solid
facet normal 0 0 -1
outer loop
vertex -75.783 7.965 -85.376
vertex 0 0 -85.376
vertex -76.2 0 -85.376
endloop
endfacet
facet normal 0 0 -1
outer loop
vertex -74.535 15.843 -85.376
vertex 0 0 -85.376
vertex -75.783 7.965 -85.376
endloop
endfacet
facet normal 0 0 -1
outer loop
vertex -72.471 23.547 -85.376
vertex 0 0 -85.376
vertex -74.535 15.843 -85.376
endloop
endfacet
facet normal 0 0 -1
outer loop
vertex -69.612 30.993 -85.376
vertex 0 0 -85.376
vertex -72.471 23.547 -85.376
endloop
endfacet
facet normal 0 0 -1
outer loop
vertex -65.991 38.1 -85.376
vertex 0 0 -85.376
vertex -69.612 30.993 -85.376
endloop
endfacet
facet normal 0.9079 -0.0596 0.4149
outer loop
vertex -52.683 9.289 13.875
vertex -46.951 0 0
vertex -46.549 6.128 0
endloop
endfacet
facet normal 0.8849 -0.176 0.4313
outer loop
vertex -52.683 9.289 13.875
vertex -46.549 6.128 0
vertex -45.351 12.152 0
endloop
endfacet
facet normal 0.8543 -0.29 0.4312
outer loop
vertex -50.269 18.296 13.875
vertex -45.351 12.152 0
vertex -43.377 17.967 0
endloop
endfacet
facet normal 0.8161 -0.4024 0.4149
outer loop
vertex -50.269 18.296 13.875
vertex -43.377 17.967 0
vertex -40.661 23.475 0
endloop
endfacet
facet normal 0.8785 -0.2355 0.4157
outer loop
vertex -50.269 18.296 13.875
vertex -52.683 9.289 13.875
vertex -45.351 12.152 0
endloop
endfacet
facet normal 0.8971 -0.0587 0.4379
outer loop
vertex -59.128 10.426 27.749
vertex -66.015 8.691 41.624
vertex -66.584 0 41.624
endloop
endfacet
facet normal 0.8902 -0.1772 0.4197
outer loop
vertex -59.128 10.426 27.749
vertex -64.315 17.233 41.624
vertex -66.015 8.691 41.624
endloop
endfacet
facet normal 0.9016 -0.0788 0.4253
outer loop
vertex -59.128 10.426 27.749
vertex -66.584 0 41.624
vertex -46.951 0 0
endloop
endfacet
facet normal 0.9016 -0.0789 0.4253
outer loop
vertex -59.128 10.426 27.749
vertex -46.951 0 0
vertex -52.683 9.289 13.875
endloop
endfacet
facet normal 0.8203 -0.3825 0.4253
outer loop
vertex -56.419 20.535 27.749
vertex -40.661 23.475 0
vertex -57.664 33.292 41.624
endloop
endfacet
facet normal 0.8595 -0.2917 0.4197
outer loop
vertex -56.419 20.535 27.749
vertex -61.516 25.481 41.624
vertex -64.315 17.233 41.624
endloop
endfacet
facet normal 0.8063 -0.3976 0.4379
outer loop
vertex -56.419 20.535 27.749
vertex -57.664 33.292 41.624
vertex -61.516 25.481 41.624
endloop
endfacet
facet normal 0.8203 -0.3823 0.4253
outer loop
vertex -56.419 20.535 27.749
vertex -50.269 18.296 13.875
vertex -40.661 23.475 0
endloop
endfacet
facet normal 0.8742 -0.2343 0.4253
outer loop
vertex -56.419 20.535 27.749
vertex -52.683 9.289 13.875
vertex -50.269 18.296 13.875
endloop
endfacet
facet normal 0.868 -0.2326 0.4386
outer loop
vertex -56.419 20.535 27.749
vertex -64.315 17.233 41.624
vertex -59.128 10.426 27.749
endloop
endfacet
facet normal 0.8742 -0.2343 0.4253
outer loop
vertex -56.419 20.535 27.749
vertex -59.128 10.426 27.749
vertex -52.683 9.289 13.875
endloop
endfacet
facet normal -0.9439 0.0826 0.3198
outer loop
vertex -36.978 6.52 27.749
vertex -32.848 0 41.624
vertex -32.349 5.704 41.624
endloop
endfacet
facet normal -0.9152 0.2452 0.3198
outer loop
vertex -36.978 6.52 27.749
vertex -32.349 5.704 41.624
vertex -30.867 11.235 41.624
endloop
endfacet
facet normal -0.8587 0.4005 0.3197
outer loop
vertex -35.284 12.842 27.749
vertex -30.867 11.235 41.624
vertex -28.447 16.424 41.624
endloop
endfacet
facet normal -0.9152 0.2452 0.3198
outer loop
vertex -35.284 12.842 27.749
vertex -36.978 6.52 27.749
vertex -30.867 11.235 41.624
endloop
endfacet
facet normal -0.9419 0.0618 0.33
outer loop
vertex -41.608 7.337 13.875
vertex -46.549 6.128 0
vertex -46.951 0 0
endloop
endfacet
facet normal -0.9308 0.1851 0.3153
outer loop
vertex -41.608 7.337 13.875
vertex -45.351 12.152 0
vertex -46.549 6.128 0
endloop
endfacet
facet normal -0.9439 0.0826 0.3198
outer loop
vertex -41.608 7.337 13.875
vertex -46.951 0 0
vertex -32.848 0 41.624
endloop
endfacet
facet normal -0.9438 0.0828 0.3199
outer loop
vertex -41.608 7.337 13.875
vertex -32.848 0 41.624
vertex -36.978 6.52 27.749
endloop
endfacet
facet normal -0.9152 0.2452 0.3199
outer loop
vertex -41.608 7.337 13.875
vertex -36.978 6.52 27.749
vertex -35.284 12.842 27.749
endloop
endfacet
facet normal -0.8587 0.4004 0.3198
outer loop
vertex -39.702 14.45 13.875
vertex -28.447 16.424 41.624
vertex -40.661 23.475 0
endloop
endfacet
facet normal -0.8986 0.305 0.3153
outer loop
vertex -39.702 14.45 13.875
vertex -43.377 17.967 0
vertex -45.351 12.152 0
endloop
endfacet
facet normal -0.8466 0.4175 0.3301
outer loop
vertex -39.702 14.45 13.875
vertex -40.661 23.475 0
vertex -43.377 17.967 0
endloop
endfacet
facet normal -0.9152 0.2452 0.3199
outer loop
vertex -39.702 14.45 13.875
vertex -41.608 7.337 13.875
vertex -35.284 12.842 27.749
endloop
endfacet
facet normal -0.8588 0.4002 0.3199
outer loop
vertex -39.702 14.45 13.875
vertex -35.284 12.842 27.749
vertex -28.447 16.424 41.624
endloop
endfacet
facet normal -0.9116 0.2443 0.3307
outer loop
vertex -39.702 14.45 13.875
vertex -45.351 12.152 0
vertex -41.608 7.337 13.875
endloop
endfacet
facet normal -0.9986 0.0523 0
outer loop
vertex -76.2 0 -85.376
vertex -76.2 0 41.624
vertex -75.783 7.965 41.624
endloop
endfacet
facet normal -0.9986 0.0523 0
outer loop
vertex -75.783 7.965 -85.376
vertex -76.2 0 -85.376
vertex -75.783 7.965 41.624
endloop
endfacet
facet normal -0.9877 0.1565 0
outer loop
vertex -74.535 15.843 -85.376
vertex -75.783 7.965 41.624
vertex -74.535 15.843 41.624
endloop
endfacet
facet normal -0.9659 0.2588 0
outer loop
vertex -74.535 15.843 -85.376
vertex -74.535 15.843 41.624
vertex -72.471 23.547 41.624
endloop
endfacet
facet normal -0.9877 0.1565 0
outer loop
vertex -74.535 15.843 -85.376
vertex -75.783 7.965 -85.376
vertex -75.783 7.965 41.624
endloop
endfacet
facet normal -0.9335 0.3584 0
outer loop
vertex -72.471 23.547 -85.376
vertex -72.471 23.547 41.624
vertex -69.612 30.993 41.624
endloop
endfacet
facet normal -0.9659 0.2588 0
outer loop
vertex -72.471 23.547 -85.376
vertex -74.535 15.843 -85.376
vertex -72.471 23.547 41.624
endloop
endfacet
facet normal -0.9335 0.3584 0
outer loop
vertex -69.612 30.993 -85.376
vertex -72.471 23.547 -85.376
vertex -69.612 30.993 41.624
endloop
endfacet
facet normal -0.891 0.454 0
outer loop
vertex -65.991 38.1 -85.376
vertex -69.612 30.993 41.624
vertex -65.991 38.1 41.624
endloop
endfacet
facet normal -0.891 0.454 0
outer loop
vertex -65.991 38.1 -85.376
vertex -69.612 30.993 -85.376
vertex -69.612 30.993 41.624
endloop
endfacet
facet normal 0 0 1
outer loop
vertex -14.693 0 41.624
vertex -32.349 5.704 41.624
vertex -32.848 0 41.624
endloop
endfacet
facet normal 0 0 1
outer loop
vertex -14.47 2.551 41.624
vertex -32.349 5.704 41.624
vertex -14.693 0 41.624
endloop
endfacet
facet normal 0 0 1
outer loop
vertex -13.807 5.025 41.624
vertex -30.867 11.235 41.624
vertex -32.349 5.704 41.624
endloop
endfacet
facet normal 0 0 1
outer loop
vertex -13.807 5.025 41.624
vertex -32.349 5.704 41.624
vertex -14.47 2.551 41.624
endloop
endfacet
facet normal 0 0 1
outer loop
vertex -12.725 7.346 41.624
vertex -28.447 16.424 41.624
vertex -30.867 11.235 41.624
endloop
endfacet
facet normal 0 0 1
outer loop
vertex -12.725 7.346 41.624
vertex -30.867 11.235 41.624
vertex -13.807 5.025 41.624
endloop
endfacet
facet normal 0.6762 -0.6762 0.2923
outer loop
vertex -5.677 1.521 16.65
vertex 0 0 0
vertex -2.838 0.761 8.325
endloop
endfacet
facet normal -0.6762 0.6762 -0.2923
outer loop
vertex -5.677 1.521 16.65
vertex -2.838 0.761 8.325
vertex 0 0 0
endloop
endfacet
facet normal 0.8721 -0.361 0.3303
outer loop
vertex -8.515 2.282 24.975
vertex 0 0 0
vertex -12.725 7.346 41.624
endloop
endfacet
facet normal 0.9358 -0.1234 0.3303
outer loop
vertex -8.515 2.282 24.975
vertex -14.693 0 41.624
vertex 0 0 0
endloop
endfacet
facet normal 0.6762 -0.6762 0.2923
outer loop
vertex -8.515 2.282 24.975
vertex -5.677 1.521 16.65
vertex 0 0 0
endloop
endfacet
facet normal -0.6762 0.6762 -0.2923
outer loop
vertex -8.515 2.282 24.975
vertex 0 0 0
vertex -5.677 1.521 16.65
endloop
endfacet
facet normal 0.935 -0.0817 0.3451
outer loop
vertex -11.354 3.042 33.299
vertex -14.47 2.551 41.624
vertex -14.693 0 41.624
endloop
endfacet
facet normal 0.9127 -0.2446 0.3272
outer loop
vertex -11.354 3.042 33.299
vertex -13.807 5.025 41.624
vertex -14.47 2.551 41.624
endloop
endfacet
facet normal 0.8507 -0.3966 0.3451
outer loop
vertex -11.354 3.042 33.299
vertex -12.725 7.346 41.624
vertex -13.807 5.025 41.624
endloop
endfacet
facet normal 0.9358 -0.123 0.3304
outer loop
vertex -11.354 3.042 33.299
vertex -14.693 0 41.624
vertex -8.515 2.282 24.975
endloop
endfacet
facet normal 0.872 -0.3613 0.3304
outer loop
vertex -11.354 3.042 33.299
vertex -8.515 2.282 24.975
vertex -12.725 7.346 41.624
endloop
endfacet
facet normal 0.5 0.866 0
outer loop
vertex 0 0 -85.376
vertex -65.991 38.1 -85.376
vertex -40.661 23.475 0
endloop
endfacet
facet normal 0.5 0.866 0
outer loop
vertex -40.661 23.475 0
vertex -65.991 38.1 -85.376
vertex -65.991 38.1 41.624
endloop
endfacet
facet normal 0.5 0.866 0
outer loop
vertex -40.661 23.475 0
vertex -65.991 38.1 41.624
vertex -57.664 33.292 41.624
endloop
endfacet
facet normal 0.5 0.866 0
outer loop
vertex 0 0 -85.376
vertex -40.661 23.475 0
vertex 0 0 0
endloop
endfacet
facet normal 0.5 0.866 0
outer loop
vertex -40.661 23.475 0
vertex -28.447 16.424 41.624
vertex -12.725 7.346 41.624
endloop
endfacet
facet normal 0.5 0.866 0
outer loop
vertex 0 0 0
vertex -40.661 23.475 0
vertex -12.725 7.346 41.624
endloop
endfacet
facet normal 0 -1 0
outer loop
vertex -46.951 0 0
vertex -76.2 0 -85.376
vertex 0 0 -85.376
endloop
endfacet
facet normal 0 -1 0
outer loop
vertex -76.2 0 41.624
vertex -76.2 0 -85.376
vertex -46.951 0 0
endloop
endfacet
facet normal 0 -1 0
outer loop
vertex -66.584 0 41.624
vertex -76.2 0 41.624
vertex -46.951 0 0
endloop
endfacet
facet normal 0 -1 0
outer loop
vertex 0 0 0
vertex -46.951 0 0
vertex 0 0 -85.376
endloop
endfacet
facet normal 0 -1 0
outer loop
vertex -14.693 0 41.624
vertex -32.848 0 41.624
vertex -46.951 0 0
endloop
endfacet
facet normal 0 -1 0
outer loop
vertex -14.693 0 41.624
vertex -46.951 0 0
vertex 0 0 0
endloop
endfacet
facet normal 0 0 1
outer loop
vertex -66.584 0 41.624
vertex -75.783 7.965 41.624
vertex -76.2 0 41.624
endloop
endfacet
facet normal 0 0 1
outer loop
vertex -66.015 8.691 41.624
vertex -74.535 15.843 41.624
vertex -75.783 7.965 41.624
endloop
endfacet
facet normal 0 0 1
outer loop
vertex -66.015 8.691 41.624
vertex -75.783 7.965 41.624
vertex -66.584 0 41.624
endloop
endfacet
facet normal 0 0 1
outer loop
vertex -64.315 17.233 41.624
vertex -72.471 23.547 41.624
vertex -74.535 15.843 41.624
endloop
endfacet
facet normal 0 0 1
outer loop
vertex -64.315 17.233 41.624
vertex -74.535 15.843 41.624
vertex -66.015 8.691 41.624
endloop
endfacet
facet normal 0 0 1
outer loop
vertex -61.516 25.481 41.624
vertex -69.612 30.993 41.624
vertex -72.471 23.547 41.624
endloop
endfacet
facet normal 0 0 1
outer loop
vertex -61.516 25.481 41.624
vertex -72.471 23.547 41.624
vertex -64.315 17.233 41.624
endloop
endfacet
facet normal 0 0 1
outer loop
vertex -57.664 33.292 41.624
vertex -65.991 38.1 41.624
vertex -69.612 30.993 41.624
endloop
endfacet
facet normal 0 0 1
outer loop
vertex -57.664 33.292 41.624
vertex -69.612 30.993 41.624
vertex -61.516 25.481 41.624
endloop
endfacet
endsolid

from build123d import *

# Parameters (mm, degrees)
F1_ANGLE = 30


with BuildPart() as f1:
    # F0 (on Front) → F1 (revolve)
    with BuildSketch(Plane.XZ):
        Polygon((0, -85.375826), (0, 0), (-14.692988, 41.624174), (-32.847719, 41.624174), (-46.950776, 0), (-66.58428, 41.624174), (-76.2, 41.624174), (-76.2, -85.375826), align=None)
    revolve(axis=Axis((0, 0, -21.875826), (0, 0, -1)), revolution_arc=F1_ANGLE)


solid = f1.part
